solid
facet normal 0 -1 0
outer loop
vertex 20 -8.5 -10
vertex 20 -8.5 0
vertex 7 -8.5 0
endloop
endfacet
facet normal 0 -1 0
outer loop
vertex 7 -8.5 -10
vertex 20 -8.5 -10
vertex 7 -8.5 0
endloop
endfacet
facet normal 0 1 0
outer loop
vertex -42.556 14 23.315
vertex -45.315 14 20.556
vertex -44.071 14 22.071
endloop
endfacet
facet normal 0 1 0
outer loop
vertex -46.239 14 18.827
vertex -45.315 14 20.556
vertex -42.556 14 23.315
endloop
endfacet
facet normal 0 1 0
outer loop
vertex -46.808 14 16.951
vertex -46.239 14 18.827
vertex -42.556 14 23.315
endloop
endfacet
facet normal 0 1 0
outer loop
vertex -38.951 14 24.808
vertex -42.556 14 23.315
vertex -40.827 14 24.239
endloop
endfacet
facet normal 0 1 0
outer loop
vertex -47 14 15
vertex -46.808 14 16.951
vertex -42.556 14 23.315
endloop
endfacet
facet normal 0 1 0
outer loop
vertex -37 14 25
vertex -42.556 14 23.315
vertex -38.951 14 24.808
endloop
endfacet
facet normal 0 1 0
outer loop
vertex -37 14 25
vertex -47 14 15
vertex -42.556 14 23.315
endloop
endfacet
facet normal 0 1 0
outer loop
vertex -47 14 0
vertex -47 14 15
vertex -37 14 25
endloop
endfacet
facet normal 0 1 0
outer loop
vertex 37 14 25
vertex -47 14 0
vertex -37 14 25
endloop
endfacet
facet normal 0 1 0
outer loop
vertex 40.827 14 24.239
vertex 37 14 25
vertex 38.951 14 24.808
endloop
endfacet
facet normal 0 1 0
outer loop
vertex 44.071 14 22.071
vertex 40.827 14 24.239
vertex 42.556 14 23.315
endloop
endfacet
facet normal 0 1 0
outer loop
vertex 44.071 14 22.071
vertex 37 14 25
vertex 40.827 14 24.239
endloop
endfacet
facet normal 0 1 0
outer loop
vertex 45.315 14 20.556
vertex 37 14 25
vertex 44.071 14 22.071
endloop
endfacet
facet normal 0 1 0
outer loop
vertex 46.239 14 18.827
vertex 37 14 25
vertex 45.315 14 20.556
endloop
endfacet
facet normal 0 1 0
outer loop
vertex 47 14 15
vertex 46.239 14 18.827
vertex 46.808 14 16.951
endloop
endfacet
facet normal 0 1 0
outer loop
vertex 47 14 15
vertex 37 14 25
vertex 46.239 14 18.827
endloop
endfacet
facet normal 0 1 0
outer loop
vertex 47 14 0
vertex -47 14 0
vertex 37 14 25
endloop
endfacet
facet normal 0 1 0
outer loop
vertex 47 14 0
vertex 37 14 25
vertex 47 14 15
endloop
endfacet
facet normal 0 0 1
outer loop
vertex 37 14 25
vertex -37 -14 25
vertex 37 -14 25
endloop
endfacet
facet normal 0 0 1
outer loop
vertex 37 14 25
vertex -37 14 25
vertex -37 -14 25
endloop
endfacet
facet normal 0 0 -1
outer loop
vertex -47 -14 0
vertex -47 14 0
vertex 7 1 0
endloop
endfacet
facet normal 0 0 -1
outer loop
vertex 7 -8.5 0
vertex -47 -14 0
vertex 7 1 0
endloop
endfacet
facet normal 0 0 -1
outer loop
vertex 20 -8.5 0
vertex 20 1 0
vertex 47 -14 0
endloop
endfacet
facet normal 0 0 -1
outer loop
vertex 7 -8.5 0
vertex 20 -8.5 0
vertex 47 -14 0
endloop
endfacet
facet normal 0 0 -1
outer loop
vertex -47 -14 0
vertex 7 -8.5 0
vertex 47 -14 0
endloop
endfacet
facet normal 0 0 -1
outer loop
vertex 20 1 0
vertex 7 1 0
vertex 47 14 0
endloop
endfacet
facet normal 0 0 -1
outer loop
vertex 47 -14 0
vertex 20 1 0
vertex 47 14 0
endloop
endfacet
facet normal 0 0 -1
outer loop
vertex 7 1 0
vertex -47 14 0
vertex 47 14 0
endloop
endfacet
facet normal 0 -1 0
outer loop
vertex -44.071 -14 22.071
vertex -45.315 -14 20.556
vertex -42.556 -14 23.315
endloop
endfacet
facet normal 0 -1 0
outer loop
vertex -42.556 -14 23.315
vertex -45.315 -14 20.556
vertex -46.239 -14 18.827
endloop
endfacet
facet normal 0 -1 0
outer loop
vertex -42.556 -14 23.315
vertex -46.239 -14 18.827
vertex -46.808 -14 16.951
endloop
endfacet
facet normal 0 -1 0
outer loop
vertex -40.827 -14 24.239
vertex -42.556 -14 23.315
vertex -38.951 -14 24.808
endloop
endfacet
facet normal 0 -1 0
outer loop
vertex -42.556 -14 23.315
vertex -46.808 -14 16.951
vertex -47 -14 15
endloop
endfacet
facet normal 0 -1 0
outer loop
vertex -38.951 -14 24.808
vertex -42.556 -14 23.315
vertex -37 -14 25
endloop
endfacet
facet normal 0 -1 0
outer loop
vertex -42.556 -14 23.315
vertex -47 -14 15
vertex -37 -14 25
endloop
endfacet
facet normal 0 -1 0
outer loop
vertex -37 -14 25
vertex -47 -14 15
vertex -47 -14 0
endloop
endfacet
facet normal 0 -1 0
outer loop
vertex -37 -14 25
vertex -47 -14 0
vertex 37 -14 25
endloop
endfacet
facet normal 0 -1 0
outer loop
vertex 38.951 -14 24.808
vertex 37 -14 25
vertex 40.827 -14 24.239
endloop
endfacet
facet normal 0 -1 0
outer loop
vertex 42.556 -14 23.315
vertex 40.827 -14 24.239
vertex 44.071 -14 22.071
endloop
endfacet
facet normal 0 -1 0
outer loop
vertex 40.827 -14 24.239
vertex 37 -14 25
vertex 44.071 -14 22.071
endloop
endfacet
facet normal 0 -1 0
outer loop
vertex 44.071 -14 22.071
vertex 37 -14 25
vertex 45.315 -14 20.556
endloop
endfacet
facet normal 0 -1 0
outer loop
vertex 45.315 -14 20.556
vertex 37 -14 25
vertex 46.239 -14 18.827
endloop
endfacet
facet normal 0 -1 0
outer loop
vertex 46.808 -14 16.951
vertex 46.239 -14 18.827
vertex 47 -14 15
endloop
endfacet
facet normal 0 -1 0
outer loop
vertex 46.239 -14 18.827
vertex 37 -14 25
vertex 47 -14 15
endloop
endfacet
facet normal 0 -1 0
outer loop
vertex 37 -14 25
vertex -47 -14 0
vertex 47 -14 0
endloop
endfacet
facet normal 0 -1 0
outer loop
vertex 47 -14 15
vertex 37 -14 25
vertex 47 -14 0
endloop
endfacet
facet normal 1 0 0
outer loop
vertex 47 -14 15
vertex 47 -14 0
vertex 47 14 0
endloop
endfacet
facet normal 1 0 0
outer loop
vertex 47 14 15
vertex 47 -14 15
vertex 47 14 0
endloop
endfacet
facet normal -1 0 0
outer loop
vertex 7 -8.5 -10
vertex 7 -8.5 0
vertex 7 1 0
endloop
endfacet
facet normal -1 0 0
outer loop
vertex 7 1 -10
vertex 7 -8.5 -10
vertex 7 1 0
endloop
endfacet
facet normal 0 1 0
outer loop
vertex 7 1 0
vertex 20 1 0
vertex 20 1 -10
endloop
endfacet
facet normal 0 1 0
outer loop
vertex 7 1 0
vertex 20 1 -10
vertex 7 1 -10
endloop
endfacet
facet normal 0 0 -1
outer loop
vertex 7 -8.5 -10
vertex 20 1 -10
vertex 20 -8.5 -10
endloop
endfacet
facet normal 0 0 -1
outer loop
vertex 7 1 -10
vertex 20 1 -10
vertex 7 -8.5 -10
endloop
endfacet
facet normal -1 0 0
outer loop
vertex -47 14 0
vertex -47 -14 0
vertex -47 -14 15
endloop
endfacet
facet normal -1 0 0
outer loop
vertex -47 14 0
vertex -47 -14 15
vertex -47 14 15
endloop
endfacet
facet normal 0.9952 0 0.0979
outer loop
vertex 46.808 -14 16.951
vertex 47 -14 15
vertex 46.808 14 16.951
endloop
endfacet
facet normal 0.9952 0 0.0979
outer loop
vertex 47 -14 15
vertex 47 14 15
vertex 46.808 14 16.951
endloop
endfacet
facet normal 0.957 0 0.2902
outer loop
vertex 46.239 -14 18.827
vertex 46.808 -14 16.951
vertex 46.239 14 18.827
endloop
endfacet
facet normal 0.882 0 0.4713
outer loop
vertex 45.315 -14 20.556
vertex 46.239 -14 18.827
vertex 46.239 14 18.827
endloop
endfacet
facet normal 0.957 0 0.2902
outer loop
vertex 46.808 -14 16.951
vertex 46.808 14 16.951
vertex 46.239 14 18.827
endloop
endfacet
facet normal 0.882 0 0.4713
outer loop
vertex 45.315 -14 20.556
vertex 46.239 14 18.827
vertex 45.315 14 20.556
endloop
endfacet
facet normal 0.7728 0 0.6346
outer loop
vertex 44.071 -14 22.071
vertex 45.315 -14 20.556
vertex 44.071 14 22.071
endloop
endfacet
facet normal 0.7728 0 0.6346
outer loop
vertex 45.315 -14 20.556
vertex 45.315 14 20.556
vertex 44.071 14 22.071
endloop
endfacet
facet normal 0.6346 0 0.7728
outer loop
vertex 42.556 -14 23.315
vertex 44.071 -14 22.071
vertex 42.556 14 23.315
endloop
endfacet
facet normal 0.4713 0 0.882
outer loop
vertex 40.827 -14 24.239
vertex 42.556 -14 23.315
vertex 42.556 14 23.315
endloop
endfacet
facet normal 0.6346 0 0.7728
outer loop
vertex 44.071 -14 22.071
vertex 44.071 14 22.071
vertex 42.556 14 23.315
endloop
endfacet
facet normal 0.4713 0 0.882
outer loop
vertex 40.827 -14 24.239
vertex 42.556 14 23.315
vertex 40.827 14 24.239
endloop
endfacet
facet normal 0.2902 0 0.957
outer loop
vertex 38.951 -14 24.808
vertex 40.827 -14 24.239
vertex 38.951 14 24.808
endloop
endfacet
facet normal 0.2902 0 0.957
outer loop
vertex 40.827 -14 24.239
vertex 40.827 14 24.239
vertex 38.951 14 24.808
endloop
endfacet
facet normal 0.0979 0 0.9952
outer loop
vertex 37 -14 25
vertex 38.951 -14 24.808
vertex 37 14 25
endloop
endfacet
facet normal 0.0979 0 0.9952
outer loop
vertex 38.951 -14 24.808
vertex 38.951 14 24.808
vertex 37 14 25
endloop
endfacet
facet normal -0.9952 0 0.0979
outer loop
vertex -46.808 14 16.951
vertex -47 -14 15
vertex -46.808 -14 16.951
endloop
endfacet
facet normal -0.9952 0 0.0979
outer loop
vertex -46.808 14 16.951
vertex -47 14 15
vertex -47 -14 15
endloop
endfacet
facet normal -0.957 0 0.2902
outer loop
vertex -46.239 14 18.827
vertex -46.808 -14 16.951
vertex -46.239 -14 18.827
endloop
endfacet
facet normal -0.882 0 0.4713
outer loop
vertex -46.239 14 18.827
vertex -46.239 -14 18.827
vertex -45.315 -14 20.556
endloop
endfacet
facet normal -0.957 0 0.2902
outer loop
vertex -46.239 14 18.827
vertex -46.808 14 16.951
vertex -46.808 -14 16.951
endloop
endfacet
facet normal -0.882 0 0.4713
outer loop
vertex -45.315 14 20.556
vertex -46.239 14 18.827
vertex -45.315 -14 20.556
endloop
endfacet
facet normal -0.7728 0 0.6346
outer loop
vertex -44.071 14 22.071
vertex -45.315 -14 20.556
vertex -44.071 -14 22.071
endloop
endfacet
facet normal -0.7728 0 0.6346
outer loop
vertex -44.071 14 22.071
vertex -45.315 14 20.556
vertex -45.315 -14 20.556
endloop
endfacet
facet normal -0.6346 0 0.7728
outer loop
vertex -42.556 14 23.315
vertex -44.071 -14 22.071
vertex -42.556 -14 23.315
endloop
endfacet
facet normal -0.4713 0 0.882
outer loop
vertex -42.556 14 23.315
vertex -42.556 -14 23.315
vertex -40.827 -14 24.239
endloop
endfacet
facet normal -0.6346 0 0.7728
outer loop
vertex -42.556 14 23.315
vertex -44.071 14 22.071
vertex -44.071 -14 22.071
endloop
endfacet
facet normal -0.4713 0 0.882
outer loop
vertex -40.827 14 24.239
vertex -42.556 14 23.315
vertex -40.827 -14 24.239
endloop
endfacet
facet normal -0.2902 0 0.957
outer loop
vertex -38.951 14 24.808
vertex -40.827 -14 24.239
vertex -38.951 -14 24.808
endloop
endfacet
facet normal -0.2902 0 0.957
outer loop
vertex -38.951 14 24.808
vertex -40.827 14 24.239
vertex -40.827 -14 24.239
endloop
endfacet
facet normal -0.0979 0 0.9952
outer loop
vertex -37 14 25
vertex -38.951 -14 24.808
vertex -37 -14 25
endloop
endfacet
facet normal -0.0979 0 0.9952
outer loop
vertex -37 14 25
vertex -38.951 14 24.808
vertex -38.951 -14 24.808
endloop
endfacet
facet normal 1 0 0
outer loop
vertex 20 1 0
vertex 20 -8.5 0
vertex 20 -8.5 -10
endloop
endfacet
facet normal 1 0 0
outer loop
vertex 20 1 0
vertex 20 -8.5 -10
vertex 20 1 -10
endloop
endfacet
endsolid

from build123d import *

# Parameters (mm, degrees)
SKETCH1_W           = 94
SKETCH1_H           = 28
BOSS_EXTRUDE1_DEPTH = 25
FILLET1_R           = 10
SKETCH2_W           = 13
SKETCH2_H           = 9.5
BOSS_EXTRUDE2_DEPTH = 10


with BuildPart() as part:
    # Sketch1 → Boss-Extrude1 (new body)
    with BuildSketch(Plane.XY):
        Rectangle(SKETCH1_W, SKETCH1_H)
    extrude(amount=BOSS_EXTRUDE1_DEPTH)

    # Fillet1
    fillet1_edges = [part.edges().sort_by_distance(p)[0] for p in [
        (-47, 0, 25),
        (47, 0, 25),
    ]]
    fillet(fillet1_edges, radius=FILLET1_R)

    # Sketch2 → Boss-Extrude2 (add)
    with BuildSketch(Plane(origin=(0, 0, 0), x_dir=(-1, 0, 0), z_dir=(0, 0, -1))):
        with Locations((-13.5, -3.75)):
            Rectangle(SKETCH2_W, SKETCH2_H)
    extrude(amount=BOSS_EXTRUDE2_DEPTH)


solid = part.part
